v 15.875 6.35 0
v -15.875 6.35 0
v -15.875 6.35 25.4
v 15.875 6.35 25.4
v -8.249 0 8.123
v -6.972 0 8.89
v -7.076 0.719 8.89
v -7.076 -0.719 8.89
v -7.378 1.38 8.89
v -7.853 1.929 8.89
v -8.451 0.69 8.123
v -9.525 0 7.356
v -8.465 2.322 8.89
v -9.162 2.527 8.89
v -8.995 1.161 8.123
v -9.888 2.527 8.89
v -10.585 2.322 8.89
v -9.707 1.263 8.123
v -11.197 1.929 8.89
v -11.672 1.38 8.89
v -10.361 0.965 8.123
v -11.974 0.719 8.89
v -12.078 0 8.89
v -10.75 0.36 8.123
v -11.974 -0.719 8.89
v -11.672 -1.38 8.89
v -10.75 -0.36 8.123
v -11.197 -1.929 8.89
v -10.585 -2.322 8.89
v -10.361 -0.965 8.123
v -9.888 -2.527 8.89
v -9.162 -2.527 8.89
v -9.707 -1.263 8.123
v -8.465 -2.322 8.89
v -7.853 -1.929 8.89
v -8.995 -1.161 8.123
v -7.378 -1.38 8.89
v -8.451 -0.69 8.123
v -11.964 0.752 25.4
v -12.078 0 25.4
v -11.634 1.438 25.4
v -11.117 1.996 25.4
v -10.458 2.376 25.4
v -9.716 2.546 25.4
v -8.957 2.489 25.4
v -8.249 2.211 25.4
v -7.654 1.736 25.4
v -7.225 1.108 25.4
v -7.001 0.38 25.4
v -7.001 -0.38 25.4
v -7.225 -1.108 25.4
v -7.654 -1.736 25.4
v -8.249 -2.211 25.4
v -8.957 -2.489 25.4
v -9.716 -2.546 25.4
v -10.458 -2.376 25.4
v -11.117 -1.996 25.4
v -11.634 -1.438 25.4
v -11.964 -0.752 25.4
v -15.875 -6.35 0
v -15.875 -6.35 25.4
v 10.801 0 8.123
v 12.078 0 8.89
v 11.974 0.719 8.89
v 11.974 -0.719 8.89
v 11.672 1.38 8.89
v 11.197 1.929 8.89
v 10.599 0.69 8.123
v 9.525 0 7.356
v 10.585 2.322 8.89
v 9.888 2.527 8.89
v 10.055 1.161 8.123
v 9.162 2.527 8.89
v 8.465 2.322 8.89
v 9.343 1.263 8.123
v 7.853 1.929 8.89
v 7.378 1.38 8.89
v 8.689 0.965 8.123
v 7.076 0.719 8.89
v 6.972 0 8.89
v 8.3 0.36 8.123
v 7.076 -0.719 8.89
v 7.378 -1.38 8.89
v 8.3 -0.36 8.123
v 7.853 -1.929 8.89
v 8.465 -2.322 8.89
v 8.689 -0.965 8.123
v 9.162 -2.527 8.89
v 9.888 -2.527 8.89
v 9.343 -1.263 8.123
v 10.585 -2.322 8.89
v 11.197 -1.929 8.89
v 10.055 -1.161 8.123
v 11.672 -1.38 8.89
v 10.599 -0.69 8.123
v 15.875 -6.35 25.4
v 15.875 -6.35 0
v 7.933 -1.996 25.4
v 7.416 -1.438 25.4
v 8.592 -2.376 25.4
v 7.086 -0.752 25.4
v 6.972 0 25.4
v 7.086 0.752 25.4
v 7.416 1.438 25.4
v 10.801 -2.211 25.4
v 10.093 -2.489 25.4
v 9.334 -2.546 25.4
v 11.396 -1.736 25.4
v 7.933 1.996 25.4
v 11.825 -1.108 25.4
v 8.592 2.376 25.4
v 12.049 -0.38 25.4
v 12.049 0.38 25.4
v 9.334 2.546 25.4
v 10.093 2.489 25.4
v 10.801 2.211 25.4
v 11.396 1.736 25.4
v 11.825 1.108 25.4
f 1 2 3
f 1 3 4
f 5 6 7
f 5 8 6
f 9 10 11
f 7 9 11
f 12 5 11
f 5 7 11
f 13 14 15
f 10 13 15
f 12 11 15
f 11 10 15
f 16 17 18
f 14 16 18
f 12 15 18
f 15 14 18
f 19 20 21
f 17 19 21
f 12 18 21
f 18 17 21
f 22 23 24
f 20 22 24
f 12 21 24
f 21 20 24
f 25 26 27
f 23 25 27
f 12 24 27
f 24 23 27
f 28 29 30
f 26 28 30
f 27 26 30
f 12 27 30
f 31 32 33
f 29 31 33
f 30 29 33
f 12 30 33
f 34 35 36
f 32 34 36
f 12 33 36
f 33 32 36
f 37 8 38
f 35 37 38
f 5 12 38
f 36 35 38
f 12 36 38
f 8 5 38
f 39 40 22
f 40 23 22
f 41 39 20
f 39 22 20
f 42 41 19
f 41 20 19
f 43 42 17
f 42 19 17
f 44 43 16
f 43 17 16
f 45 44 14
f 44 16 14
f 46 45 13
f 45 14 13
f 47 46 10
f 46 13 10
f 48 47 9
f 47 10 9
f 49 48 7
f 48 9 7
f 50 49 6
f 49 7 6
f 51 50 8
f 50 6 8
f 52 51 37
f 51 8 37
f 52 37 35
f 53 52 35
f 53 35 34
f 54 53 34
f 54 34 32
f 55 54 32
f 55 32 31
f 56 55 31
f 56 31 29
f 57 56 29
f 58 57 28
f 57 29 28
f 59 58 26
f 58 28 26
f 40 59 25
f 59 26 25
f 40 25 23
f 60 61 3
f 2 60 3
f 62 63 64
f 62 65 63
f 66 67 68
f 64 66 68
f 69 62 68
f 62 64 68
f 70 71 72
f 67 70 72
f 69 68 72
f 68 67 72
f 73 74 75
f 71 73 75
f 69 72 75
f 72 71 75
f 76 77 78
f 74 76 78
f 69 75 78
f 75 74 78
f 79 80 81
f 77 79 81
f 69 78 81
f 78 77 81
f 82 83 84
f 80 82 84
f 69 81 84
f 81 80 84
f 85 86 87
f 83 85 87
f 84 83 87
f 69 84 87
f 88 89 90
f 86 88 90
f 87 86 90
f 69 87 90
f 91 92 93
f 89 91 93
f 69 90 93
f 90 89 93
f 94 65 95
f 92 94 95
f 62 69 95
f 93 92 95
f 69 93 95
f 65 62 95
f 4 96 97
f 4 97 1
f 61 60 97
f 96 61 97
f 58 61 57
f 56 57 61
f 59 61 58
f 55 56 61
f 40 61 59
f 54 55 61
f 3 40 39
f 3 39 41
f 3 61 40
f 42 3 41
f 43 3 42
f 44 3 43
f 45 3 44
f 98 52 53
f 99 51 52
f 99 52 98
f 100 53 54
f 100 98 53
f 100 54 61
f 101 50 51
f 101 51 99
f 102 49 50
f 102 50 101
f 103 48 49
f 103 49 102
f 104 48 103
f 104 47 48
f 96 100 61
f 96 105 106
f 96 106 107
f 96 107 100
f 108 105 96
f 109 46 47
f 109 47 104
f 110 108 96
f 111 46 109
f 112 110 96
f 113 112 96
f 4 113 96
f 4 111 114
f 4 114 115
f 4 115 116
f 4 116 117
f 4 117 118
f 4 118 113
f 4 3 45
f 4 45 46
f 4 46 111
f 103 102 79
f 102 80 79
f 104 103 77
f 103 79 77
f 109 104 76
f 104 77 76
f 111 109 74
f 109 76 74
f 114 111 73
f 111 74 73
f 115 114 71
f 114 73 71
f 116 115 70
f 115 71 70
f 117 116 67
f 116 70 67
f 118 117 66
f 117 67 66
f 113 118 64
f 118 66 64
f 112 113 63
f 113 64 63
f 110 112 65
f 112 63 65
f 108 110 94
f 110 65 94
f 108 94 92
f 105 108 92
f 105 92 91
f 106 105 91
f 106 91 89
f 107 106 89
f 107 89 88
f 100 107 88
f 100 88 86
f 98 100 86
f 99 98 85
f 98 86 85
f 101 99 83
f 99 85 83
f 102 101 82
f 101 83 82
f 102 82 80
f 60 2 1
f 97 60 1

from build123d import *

# Parameters (mm, degrees)
SKETCH1_W                   = 31.75
SKETCH1_H                   = 12.7
BOSS_EXTRUDE1_DEPTH         = 25.4
F_1_4_20_TAPPED_HOLE1_D     = 5.1054
F_1_4_20_TAPPED_HOLE1_DEPTH = 16.51
F_1_4_20_TAPPED_HOLE1_TIP   = 1.533816902


with BuildPart() as part:
    # Sketch1 → Boss-Extrude1 (new body)
    with BuildSketch(Plane.XY):
        Rectangle(SKETCH1_W, SKETCH1_H)
    extrude(amount=BOSS_EXTRUDE1_DEPTH)

    # 1/4-20 Tapped Hole1
    with Locations(Plane.XY.offset(25.4)):
        with Locations((-9.525, 0), (9.525, 0)):
            Hole(F_1_4_20_TAPPED_HOLE1_D / 2, depth=F_1_4_20_TAPPED_HOLE1_DEPTH)
            with Locations((0, 0, -(F_1_4_20_TAPPED_HOLE1_DEPTH + F_1_4_20_TAPPED_HOLE1_TIP / 2))):  # 118° drill point
                Cone(0, F_1_4_20_TAPPED_HOLE1_D / 2, F_1_4_20_TAPPED_HOLE1_TIP, mode=Mode.SUBTRACT)


solid = part.part
